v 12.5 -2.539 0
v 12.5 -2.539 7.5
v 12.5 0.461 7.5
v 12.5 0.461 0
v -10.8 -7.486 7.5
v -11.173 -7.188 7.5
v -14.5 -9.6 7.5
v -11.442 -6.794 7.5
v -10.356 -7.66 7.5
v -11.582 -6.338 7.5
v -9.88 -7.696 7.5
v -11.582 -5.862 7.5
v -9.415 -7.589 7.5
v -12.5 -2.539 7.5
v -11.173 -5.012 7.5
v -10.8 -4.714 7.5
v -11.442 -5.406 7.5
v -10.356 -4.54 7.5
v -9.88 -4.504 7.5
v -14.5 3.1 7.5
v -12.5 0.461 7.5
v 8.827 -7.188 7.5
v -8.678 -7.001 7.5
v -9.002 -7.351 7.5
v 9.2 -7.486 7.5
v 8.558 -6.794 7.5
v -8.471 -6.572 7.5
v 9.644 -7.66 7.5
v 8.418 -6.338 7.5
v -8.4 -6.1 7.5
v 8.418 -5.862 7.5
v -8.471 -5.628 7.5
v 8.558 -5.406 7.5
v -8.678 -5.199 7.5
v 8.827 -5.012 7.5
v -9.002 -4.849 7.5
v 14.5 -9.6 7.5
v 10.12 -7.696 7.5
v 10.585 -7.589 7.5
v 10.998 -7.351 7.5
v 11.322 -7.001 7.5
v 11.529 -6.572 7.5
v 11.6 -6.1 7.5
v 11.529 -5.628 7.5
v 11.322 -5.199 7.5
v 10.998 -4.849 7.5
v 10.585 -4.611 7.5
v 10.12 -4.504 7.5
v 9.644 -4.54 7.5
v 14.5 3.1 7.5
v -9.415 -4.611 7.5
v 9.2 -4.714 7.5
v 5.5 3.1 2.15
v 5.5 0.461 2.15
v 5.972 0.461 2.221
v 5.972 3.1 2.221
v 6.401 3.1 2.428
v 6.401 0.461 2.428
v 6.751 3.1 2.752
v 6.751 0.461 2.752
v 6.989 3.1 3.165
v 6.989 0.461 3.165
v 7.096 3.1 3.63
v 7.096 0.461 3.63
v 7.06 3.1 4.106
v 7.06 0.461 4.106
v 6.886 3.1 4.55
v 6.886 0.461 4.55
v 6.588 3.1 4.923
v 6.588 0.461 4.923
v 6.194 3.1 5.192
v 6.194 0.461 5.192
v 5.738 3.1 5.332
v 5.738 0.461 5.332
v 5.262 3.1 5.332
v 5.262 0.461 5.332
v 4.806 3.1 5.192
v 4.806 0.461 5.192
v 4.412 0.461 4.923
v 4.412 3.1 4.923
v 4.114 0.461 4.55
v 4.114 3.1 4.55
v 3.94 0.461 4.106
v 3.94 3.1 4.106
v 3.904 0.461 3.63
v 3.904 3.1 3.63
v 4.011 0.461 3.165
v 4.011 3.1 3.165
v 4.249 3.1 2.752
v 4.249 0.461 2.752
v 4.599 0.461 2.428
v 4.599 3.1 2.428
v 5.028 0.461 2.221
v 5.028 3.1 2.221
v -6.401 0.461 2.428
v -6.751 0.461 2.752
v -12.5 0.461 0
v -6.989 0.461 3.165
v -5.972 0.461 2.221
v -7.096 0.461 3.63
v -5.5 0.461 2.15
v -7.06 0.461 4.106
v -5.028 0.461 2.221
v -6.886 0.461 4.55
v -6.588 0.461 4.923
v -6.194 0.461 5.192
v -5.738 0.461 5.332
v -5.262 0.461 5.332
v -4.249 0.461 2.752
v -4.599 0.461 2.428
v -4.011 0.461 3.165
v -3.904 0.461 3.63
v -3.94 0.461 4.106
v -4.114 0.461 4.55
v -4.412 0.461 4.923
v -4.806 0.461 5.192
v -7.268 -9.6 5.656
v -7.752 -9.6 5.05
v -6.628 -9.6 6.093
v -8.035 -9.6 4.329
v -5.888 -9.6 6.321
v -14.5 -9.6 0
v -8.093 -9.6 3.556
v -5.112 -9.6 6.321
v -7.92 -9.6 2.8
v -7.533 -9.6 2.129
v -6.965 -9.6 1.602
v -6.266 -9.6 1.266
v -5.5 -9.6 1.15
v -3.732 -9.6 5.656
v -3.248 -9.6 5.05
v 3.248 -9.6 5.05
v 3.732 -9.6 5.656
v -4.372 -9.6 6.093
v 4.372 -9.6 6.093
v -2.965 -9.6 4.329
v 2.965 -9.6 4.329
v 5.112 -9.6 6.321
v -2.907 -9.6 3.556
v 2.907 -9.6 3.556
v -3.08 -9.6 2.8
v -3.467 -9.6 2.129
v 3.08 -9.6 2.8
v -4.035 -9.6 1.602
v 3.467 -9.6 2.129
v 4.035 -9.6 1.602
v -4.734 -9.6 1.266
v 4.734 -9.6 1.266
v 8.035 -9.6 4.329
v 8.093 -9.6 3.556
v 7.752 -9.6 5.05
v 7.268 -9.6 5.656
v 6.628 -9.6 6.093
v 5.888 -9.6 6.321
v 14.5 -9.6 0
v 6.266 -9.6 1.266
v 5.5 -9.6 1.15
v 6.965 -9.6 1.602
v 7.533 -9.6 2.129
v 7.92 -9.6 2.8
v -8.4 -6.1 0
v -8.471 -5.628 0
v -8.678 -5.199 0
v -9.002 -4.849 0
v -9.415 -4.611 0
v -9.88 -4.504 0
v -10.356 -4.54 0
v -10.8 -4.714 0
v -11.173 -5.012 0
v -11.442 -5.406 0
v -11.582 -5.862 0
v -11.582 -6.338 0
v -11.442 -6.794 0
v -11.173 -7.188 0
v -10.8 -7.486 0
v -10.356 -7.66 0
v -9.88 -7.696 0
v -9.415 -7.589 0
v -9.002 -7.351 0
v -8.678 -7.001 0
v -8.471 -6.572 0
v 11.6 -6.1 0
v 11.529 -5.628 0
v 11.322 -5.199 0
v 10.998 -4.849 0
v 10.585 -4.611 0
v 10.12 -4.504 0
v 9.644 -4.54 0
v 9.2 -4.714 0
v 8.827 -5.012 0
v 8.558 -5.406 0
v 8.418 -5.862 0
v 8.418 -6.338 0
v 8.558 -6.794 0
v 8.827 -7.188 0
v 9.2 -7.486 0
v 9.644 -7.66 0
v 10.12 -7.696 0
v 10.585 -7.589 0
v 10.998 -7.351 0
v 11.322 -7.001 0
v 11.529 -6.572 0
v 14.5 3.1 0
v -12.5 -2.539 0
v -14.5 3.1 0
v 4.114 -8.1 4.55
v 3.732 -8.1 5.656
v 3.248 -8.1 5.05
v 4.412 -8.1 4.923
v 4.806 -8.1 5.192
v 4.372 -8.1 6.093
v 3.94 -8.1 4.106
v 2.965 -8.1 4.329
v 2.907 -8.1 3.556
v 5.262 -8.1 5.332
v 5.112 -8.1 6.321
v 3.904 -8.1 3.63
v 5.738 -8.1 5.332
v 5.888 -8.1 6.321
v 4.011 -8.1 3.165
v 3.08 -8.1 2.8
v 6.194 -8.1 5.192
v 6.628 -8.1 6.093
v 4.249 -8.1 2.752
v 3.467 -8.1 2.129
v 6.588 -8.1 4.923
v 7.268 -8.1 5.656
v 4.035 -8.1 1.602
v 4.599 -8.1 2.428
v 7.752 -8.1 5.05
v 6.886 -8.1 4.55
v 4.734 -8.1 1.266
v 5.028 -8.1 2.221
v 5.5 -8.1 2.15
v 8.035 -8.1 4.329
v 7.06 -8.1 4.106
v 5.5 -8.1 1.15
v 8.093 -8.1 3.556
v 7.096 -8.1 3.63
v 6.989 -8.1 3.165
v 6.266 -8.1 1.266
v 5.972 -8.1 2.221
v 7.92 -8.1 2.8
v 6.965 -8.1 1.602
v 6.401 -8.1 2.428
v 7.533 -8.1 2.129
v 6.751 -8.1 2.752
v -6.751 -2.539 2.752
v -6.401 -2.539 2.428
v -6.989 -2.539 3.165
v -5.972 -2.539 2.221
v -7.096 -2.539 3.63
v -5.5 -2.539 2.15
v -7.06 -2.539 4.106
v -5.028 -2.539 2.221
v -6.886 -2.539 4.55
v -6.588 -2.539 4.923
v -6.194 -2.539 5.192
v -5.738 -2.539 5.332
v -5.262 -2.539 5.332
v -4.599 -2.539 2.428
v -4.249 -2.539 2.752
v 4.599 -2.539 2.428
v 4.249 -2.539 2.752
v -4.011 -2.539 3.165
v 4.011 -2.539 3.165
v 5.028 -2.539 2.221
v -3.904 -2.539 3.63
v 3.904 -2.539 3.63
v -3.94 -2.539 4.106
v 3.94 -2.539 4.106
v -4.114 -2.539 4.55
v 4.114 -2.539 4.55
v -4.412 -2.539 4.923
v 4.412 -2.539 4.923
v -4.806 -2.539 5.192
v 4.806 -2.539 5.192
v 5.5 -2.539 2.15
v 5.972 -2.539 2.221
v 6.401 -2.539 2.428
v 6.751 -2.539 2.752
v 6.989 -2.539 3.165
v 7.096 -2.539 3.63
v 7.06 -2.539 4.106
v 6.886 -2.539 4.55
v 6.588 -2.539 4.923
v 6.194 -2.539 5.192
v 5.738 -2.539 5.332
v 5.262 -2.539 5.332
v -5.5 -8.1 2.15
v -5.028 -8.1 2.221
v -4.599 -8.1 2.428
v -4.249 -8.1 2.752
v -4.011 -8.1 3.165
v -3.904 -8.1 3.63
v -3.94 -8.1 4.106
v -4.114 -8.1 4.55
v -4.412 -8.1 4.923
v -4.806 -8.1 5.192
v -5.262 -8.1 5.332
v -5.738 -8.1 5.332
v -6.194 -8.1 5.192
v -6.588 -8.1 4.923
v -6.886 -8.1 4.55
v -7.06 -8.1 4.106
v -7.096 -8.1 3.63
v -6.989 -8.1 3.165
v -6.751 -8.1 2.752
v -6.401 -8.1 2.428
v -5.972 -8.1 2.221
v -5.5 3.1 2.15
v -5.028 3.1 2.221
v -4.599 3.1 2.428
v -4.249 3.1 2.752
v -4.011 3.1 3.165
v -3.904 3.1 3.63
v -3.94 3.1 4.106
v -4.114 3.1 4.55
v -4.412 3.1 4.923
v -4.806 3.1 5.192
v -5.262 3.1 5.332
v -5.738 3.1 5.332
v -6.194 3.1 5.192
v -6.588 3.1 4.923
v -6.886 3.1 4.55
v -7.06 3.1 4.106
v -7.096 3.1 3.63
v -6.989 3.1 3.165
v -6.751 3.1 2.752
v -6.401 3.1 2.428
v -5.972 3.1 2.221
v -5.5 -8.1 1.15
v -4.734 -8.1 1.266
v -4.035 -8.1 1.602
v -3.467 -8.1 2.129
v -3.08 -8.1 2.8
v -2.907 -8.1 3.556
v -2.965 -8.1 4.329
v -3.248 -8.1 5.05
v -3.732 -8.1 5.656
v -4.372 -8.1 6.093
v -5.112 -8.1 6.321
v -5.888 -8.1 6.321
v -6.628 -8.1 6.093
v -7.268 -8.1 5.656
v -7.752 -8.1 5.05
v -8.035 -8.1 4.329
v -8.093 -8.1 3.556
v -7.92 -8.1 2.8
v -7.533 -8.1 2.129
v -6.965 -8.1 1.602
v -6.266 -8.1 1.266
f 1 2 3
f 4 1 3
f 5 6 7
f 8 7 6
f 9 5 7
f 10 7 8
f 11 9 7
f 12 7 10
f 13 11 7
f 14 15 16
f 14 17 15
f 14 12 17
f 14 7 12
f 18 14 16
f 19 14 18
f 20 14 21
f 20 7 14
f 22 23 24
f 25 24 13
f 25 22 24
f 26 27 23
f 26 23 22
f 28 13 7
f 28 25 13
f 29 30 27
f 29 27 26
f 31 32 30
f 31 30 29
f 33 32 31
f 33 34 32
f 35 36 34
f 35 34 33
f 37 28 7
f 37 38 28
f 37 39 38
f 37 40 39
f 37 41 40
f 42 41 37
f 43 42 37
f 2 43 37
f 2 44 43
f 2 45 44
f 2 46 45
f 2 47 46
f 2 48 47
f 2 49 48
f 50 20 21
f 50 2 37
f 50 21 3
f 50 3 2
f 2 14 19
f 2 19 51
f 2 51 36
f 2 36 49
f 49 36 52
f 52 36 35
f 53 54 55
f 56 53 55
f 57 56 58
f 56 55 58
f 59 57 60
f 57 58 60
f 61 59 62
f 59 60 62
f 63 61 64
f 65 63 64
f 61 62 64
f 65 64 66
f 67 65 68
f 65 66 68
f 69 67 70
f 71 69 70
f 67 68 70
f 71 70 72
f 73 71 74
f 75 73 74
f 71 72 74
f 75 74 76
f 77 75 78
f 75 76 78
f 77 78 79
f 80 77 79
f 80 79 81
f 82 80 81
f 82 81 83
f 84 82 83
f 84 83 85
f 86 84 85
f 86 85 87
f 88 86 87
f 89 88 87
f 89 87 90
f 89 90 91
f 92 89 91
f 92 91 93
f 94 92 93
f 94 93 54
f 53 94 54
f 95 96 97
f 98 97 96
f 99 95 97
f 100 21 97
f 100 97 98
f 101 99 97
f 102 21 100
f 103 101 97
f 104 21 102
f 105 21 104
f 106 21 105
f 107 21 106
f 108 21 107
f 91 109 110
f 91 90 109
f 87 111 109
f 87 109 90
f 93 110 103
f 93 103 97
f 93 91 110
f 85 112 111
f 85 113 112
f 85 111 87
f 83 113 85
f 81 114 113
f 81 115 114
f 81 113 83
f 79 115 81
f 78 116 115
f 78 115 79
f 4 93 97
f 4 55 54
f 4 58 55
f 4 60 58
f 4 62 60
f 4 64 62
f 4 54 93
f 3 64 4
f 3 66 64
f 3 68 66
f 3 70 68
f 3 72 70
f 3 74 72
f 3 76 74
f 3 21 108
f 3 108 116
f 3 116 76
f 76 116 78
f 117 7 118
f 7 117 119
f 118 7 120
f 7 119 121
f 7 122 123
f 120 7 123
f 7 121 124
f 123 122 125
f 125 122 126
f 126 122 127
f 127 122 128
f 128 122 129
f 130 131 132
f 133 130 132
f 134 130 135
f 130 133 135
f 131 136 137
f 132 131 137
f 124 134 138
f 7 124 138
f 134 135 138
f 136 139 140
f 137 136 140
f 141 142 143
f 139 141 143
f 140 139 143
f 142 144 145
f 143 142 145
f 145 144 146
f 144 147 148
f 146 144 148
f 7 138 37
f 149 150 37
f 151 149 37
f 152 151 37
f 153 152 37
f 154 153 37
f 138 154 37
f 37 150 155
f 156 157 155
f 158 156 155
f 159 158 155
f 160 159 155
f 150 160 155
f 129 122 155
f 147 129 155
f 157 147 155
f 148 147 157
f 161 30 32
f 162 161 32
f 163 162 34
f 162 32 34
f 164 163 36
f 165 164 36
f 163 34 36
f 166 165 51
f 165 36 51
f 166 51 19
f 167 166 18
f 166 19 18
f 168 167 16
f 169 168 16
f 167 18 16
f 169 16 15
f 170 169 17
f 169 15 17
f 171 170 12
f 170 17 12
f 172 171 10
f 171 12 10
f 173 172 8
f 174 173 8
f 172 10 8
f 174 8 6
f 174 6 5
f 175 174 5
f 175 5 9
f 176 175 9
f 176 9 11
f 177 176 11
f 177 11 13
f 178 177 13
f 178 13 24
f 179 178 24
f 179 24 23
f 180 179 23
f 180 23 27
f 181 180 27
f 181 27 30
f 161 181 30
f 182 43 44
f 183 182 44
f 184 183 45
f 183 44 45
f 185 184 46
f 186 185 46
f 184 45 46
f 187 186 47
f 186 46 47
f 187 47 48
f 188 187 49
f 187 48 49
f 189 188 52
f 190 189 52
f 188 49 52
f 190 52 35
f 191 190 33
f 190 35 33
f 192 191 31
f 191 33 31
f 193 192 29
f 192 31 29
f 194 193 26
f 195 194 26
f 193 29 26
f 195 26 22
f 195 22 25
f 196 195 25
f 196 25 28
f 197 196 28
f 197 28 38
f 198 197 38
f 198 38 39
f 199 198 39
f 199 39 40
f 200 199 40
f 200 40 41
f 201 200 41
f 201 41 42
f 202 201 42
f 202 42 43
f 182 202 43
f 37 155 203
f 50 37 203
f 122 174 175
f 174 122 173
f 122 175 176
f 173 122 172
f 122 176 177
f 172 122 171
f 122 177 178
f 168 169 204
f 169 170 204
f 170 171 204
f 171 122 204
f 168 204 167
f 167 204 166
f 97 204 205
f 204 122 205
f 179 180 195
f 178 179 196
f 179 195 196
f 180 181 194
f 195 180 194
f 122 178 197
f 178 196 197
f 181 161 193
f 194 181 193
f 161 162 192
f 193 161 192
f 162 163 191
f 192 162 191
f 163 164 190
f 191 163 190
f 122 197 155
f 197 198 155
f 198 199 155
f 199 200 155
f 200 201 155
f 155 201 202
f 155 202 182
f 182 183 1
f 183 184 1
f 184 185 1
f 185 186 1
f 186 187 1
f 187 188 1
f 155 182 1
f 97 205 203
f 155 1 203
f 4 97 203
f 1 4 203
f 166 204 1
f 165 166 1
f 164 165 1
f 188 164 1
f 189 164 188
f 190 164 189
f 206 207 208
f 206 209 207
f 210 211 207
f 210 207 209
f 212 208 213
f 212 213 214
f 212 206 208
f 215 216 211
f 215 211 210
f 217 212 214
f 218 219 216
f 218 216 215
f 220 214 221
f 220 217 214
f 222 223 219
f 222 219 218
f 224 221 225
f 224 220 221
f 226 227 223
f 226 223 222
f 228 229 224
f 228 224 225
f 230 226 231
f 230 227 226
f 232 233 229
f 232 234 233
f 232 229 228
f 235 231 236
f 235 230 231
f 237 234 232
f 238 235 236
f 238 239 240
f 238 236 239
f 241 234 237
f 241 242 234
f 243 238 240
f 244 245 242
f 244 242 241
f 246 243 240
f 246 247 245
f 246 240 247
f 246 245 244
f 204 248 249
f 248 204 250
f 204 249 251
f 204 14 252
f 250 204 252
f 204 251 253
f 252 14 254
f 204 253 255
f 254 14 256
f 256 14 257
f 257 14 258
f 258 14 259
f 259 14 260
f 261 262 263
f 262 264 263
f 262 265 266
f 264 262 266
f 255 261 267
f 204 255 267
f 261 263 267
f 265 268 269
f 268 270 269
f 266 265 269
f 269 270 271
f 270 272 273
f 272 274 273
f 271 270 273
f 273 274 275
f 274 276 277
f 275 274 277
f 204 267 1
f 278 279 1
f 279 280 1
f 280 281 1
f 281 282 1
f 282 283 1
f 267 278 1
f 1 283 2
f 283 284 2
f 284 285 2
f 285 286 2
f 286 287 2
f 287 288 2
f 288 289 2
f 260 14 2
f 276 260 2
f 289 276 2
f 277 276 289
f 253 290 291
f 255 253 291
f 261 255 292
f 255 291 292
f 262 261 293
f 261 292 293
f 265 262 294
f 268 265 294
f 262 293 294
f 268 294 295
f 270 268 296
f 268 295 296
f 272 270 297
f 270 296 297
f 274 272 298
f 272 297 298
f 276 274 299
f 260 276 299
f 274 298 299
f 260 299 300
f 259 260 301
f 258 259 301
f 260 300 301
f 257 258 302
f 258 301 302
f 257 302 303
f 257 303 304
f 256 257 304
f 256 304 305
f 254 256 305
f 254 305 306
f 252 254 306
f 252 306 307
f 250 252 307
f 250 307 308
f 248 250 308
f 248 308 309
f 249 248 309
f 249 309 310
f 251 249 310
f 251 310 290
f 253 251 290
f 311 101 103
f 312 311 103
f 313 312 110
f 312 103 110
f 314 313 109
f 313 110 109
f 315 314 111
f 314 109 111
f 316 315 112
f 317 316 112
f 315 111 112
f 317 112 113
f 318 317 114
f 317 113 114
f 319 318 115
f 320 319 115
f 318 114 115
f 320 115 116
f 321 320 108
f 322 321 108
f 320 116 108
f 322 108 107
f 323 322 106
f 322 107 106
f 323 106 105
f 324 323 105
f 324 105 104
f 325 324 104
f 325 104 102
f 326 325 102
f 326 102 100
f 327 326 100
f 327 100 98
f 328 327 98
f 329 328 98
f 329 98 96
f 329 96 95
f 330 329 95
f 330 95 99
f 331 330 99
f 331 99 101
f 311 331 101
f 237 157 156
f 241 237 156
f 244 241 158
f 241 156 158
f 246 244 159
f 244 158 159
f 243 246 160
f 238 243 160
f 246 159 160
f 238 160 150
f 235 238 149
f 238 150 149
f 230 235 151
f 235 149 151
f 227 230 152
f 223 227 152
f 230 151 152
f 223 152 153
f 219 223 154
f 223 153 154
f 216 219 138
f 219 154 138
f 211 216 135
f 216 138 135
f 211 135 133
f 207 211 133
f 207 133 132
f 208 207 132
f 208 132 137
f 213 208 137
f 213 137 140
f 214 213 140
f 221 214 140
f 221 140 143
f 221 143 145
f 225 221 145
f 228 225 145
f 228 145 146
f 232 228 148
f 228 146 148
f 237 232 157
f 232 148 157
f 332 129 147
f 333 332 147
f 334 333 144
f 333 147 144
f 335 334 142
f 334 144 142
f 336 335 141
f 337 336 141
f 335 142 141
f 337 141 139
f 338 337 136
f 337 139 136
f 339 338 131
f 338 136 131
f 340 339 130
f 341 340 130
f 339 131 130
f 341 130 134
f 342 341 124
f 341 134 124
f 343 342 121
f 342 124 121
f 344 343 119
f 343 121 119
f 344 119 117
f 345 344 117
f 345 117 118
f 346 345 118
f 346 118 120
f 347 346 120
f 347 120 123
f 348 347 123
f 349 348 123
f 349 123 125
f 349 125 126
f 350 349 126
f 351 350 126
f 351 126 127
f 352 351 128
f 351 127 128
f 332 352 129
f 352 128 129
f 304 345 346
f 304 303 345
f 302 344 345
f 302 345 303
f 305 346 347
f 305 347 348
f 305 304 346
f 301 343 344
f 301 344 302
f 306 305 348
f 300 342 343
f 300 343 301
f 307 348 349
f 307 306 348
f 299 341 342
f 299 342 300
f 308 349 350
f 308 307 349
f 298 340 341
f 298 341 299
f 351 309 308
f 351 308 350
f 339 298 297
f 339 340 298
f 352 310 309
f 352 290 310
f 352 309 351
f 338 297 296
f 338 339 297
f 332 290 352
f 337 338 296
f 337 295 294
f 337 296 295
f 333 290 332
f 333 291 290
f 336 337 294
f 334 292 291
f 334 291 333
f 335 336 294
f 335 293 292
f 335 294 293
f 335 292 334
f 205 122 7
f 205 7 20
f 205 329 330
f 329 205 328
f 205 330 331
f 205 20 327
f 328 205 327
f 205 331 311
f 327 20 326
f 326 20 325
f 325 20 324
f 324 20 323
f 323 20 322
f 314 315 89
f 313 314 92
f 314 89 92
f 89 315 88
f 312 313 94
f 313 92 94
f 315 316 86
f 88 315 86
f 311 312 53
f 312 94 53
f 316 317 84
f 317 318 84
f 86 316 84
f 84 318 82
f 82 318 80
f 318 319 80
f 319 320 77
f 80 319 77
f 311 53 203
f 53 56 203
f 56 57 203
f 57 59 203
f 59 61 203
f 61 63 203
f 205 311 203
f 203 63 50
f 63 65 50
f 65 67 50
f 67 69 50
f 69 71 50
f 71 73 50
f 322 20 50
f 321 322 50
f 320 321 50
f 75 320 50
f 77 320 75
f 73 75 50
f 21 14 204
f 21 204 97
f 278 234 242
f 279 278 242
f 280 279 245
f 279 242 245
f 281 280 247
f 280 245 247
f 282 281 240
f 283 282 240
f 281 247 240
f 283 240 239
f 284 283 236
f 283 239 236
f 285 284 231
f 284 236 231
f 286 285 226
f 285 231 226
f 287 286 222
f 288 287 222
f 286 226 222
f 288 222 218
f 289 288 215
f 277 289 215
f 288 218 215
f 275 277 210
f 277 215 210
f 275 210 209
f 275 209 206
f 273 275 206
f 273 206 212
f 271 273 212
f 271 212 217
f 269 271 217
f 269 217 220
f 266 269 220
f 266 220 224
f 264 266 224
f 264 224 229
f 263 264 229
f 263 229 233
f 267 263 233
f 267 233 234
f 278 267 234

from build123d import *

# Parameters (mm, degrees)
SKETCH_1_W          = 29
SKETCH_1_H          = 19.2
EXTRUDE_1_DEPTH     = 7.5
SKETCH_2_R          = 1.6
CUT_EXTRUDE_1_DEPTH = 19.938320939
SKETCH_3_W          = 25
SKETCH_3_H          = 3
CUT_EXTRUDE_2_DEPTH = 7.5
SKETCH_4_R          = 1.6
CUT_EXTRUDE_3_DEPTH = 26.201984049
SKETCH_6_W          = 29
SKETCH_6_H          = 6.5
CUT_EXTRUDE_5_DEPTH = 19.938320939
SKETCH_7_R          = 2.6
SKETCH_7_R_2        = 1.6
CUT_EXTRUDE_6_DEPTH = 1.5


with BuildPart() as part:
    # 草图1 → 凸台-拉伸1 (new body)
    with BuildSketch(Plane.XY):
        Rectangle(SKETCH_1_W, SKETCH_1_H)
    extrude(amount=EXTRUDE_1_DEPTH)

    # 草图2 → 切除-拉伸1 (cut, through all)
    with BuildSketch(Plane.XY.offset(7.5)):
        with Locations((10, -6.1)):
            Circle(SKETCH_2_R)
        with Locations((-10, -6.1)):
            Circle(SKETCH_2_R)
    extrude(amount=-CUT_EXTRUDE_1_DEPTH, mode=Mode.SUBTRACT)

    # 草图3 → 切除-拉伸2 (cut)
    with BuildSketch(Plane.XY.offset(7.5)):
        with Locations((0, -1.0394817)):
            Rectangle(SKETCH_3_W, SKETCH_3_H)
    extrude(amount=-CUT_EXTRUDE_2_DEPTH, mode=Mode.SUBTRACT)

    # 草图4 → 切除-拉伸3 (cut, through all)
    with BuildSketch(Plane.XZ.offset(9.6)):
        with Locations(Location((-5.5, 3.75, 0), (0, 0, 270))):
            Circle(SKETCH_4_R)
        with Locations(Location((5.5, 3.75, 0), (0, 0, 270))):
            Circle(SKETCH_4_R)
    extrude(amount=-CUT_EXTRUDE_3_DEPTH, mode=Mode.SUBTRACT)

    # 草图6 → 切除-拉伸5 (cut, through all)
    with BuildSketch(Plane.XY.offset(7.5)):
        with Locations((0, 6.35)):
            Rectangle(SKETCH_6_W, SKETCH_6_H)
    extrude(amount=-CUT_EXTRUDE_5_DEPTH, mode=Mode.SUBTRACT)

    # 草图7 → 切除-拉伸6 (cut)
    # profile 1 of 2: a face of its own
    with BuildSketch(Plane.XZ.offset(9.6)):
        with Locations(Location((-5.5, 3.75, 0), (0, 0, 270))):
            Circle(SKETCH_7_R)
        with Locations(Location((-5.5, 3.75, 0), (0, 0, 270))):
            Circle(SKETCH_7_R_2, mode=Mode.SUBTRACT)
    # profile 2 of 2: a face of its own
    with BuildSketch(Plane.XZ.offset(9.6)):
        with Locations(Location((5.5, 3.75, 0), (0, 0, 270))):
            Circle(SKETCH_7_R)
        with Locations(Location((5.5, 3.75, 0), (0, 0, 270))):
            Circle(SKETCH_7_R_2, mode=Mode.SUBTRACT)
    extrude(amount=-CUT_EXTRUDE_6_DEPTH, mode=Mode.SUBTRACT)


solid = part.part
